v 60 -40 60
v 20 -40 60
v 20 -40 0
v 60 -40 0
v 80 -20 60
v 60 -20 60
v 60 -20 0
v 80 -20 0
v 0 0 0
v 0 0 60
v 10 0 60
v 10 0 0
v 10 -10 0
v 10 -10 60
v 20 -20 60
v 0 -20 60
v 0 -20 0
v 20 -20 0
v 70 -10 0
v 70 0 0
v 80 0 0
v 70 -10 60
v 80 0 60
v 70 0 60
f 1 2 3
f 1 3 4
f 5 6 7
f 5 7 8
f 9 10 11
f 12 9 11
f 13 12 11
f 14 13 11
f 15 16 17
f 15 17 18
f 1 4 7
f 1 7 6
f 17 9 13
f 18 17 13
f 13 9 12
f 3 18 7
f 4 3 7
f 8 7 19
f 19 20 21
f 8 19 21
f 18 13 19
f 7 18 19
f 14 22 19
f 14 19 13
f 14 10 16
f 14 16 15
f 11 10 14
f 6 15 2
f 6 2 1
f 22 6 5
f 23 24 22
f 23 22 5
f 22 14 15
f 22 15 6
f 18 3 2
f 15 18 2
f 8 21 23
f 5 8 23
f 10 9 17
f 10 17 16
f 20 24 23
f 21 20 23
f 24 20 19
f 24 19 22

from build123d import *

# Parameters (mm, degrees)
F0_W     = 80
F0_H     = 60
F1_DEPTH = 40
F2_W     = 20
F2_H     = 60
F3_DEPTH = 20
F4_W     = 60
F4_H     = 60
F5_DEPTH = 10


with BuildPart() as f1:
    # F0 (on Front) → F1 (new body)
    with BuildSketch(Plane.XZ):
        with Locations((40, 30)):
            Rectangle(F0_W, F0_H)
    extrude(amount=F1_DEPTH)

    # F2 (on face) → F3 (cut)
    with BuildSketch(Plane.XZ.offset(40)):
        with Locations((10, 30)):
            Rectangle(F2_W, F2_H)
        with Locations((70, 30)):
            Rectangle(F2_W, F2_H)
    extrude(amount=-F3_DEPTH, mode=Mode.SUBTRACT)

    # F4 (on face) → F5 (cut)
    with BuildSketch(Plane(origin=(0, 0, 0), x_dir=(-1, 0, 0), z_dir=(0, 1, 0))):
        with Locations((-40, 30)):
            Rectangle(F4_W, F4_H)
    extrude(amount=-F5_DEPTH, mode=Mode.SUBTRACT)


solid = f1.part
